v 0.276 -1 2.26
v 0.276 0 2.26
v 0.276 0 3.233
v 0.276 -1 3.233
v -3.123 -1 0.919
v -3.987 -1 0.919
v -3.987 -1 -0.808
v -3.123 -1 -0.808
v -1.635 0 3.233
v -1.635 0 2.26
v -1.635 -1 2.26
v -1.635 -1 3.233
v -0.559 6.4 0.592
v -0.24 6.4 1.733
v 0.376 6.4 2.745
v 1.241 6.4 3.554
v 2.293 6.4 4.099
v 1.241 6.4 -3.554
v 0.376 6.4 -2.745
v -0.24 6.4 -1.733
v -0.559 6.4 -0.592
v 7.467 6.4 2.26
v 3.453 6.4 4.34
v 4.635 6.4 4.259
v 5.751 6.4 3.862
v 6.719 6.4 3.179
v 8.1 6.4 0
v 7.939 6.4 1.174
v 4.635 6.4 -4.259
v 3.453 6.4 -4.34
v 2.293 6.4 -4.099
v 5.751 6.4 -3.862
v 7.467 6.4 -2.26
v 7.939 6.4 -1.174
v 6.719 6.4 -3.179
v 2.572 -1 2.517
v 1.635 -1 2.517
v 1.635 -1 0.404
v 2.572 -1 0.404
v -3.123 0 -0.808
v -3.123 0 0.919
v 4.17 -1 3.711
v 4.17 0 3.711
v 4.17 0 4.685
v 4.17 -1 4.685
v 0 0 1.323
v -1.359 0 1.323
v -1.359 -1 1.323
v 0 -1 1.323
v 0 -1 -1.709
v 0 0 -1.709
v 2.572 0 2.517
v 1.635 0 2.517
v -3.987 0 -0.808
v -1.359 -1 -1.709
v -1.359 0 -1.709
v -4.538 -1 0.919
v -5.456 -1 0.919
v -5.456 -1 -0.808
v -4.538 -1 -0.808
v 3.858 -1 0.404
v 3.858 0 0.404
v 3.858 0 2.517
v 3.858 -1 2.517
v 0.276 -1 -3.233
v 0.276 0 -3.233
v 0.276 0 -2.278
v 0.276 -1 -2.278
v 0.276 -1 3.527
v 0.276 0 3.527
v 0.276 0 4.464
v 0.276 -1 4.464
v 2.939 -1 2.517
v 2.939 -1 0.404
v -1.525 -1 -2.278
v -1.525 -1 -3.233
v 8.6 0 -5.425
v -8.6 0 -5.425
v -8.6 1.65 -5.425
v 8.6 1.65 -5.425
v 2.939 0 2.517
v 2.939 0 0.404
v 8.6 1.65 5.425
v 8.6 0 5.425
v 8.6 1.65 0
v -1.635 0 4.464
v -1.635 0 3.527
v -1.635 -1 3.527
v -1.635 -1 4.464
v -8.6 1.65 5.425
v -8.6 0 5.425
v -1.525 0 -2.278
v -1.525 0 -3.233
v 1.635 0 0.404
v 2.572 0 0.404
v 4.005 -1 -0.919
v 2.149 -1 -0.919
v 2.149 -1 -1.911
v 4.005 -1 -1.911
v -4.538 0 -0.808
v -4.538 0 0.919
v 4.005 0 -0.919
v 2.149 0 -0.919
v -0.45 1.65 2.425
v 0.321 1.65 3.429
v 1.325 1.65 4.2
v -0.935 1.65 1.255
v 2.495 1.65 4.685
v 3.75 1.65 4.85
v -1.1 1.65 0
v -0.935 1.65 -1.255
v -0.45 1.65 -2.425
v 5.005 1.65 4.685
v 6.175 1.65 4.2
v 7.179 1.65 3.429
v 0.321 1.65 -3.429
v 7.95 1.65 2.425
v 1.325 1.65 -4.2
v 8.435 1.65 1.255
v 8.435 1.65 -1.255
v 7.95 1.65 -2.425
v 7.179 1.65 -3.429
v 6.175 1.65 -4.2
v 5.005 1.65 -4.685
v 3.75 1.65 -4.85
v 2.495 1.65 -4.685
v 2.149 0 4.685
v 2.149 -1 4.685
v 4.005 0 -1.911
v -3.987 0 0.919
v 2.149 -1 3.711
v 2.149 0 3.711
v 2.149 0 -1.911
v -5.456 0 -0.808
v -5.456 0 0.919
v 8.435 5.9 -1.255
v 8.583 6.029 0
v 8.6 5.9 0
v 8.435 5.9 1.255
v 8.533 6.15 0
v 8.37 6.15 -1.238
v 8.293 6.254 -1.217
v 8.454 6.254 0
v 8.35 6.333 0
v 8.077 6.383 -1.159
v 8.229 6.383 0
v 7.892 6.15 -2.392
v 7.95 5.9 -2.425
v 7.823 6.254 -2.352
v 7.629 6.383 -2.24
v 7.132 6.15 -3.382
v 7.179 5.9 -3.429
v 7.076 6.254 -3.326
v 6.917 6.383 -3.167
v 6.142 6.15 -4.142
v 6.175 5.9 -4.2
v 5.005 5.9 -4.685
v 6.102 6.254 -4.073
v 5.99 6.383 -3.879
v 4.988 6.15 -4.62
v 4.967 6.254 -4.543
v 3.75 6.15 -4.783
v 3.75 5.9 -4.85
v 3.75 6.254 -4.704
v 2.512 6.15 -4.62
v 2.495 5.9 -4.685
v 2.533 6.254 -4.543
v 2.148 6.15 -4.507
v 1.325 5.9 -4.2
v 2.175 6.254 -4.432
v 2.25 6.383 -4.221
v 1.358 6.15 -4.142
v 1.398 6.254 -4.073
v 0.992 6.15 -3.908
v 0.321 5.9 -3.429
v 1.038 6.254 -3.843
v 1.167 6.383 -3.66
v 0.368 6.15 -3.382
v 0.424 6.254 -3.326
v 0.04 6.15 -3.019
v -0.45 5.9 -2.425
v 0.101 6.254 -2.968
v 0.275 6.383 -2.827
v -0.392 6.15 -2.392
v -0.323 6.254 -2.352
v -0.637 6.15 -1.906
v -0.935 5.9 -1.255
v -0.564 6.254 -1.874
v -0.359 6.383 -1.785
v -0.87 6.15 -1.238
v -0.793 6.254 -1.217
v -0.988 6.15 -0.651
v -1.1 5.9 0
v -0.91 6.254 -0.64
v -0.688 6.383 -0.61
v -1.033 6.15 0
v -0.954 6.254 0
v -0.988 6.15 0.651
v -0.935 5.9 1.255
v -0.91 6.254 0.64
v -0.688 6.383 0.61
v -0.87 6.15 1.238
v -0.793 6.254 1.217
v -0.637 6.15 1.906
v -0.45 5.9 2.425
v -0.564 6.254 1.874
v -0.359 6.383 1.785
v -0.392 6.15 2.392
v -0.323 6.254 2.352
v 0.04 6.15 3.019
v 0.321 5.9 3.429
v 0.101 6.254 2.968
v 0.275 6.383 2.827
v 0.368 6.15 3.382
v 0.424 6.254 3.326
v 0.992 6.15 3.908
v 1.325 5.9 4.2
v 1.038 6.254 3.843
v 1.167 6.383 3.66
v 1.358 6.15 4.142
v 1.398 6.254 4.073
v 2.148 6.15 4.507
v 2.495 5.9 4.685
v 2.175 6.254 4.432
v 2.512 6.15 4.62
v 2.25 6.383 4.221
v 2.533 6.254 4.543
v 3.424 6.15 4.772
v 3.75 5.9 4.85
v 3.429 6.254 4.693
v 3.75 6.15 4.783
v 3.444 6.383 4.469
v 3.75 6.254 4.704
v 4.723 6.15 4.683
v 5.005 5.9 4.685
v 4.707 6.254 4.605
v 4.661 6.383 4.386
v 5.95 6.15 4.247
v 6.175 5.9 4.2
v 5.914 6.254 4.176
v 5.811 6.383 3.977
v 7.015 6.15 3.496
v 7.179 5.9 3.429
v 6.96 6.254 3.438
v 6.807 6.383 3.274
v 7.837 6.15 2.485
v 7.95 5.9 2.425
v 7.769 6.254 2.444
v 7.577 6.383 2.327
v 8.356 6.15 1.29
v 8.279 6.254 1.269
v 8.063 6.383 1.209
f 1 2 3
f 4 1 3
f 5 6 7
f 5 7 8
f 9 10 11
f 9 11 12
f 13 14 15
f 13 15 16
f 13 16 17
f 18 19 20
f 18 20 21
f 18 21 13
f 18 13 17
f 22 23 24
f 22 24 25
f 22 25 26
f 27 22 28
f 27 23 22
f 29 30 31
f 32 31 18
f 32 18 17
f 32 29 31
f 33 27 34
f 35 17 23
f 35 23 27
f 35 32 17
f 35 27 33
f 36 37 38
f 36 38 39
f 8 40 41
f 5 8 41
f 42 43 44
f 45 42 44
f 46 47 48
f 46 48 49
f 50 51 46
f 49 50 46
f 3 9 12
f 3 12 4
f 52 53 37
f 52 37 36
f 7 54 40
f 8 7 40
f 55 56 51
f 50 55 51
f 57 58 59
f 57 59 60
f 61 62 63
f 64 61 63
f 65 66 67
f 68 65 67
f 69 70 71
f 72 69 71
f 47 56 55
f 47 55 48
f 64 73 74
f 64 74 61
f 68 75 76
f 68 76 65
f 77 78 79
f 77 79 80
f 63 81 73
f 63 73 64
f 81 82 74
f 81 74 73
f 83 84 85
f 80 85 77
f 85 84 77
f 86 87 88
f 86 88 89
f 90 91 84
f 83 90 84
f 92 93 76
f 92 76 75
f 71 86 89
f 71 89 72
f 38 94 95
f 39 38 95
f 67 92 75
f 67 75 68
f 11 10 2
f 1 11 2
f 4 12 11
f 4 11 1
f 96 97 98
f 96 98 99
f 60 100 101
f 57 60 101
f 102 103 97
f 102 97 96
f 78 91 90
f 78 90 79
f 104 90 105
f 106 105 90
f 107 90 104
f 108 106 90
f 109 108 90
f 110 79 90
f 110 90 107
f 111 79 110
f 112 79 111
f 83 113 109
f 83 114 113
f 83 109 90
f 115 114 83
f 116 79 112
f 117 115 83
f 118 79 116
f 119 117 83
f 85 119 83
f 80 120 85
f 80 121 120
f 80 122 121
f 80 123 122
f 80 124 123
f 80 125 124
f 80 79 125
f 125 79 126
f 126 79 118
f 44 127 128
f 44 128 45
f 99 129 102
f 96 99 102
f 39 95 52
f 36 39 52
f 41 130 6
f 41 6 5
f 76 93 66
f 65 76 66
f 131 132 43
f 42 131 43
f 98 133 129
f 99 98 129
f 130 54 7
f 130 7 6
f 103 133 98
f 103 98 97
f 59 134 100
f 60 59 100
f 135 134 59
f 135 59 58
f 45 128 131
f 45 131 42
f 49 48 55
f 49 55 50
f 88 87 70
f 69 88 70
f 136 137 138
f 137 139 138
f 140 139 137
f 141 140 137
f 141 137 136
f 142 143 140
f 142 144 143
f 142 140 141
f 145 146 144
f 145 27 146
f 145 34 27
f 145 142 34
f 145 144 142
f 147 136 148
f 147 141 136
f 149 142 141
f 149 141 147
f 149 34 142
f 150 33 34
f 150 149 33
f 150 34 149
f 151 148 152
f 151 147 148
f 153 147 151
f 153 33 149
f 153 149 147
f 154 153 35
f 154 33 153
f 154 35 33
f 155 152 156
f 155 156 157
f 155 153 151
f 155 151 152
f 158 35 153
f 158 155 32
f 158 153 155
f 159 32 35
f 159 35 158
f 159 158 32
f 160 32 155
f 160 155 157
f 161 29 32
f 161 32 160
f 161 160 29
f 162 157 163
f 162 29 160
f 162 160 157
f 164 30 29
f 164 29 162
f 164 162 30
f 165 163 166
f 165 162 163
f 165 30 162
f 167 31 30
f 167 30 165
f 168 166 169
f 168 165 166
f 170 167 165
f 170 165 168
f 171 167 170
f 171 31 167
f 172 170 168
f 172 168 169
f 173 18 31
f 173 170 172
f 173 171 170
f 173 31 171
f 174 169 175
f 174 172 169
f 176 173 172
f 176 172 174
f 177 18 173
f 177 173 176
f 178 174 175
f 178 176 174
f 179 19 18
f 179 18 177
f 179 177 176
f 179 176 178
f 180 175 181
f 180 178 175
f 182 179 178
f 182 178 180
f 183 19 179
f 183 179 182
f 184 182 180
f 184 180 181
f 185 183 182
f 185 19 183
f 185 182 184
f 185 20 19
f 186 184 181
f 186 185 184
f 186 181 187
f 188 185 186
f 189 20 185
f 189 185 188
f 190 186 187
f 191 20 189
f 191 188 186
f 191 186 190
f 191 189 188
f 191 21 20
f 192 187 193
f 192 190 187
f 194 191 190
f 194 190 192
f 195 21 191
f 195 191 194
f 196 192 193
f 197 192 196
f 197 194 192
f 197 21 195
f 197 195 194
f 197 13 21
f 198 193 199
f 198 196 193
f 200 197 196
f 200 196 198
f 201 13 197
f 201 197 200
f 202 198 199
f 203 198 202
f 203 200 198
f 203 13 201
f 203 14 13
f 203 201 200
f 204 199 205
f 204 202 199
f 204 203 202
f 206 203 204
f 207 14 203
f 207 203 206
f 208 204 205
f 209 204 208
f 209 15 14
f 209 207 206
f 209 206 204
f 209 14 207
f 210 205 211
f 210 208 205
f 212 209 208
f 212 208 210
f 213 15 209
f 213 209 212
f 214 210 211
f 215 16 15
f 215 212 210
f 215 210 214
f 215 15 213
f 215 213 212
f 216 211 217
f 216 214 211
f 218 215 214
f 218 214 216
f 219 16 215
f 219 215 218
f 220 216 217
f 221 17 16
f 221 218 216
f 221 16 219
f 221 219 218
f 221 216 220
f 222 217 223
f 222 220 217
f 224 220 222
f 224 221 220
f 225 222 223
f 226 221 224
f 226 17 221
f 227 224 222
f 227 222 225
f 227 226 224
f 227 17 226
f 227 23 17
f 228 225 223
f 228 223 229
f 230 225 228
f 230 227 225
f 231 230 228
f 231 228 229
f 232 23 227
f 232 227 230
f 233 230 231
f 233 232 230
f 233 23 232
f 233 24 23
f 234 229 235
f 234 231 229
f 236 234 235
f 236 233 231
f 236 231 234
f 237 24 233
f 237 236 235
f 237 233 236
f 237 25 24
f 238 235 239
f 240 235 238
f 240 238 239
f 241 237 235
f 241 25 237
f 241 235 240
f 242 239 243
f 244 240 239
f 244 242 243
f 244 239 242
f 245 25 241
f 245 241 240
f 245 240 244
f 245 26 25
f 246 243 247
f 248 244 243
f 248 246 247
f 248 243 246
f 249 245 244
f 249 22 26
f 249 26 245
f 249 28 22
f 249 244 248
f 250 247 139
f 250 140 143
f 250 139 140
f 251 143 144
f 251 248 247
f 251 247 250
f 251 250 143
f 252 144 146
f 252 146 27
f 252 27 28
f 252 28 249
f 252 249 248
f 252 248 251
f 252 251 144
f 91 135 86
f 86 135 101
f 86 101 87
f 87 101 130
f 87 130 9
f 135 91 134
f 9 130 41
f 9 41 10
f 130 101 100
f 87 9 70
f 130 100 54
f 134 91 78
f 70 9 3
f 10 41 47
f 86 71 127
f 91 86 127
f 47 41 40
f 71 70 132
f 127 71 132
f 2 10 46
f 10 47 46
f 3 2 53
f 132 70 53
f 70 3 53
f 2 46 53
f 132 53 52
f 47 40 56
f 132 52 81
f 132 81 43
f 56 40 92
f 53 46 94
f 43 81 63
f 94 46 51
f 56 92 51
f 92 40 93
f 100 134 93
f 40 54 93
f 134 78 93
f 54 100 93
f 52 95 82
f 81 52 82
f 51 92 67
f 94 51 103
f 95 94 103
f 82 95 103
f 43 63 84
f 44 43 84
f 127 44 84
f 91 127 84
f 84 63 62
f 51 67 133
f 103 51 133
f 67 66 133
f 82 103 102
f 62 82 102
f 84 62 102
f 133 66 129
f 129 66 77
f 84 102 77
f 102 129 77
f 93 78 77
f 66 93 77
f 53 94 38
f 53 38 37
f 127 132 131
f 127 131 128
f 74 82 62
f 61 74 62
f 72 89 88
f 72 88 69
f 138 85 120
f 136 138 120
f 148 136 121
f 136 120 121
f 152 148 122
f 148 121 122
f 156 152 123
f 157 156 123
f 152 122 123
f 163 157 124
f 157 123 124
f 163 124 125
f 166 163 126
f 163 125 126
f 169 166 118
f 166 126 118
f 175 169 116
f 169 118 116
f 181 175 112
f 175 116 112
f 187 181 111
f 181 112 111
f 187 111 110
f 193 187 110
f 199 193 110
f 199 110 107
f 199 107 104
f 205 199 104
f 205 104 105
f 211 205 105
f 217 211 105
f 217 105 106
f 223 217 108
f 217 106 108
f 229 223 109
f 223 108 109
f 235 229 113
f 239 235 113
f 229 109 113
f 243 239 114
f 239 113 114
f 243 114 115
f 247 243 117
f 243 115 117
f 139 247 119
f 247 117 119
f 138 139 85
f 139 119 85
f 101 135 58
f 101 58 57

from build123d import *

# Parameters (mm, degrees)
SKETCH1_W           = 17.2
SKETCH1_H           = 10.85
BOSS_EXTRUDE1_DEPTH = 1.65
SKETCH2_R           = 4.85
BOSS_EXTRUDE2_DEPTH = 4.75
FILLET1_R           = 0.5
SKETCH3_W           = 1.359488803
SKETCH3_H           = 3.031292602
SKETCH3_W_2         = 1.800404091
SKETCH3_H_2         = 0.955316456
SKETCH3_W_3         = 0.863459105
SKETCH3_H_3         = 1.72691821
SKETCH3_W_4         = 0.918573516
SKETCH3_W_5         = 1.910632913
SKETCH3_H_4         = 0.936944986
SKETCH3_H_5         = 0.973687927
SKETCH3_W_6         = 2.020861734
SKETCH3_W_7         = 0.936944986
SKETCH3_H_6         = 2.112719086
SKETCH3_W_8         = 1.855518501
SKETCH3_H_7         = 0.992059397
BOSS_EXTRUDE3_DEPTH = 1


with BuildPart() as part:
    # Sketch1 → Boss-Extrude1 (new body)
    with BuildSketch(Plane(origin=(0, 0, 0), x_dir=(1, 0, 0), z_dir=(0, 1, 0))):
        Rectangle(SKETCH1_W, SKETCH1_H)
    extrude(amount=BOSS_EXTRUDE1_DEPTH)

    # Sketch2 → Boss-Extrude2 (add)
    with BuildSketch(Plane(origin=(0, 1.65, 0), x_dir=(1, 0, 0), z_dir=(0, 1, 0))):
        with Locations((3.75, 0)):
            Circle(SKETCH2_R)
    extrude(amount=BOSS_EXTRUDE2_DEPTH)

    # Fillet1
    fillet1_edges = [part.edges().sort_by_distance(p)[0] for p in [
        (-1.1, 6.4, 0),
    ]]
    fillet(fillet1_edges, radius=FILLET1_R)

    # Sketch3 → Boss-Extrude3 (add)
    with BuildSketch(Plane.XZ):
        with Locations((-0.679744402, -0.192900438)):
            Rectangle(SKETCH3_W, SKETCH3_H)
        with Locations((-0.624629991, -2.755720547)):
            Rectangle(SKETCH3_W_2, SKETCH3_H_2)
        with Locations((-3.554879506, 0.055114411)):
            Rectangle(SKETCH3_W_3, SKETCH3_H_3)
        with Locations((-4.997039925, 0.055114411)):
            Rectangle(SKETCH3_W_4, SKETCH3_H_3)
        with Locations((-0.679744402, 3.995794793)):
            Rectangle(SKETCH3_W_5, SKETCH3_H_4)
        with Locations((-0.679744402, 2.746534812)):
            Rectangle(SKETCH3_W_5, SKETCH3_H_5)
        with Locations((3.159892894, 4.197880967)):
            Rectangle(SKETCH3_W_6, SKETCH3_H_5)
        with Locations((2.103533351, 1.46053189)):
            Rectangle(SKETCH3_W_7, SKETCH3_H_6)
        with Locations((3.398722008, 1.46053189)):
            Rectangle(SKETCH3_W_4, SKETCH3_H_6)
        with Locations((3.077221278, -1.414603215)):
            Rectangle(SKETCH3_W_8, SKETCH3_H_7)
    extrude(amount=BOSS_EXTRUDE3_DEPTH)


solid = part.part
